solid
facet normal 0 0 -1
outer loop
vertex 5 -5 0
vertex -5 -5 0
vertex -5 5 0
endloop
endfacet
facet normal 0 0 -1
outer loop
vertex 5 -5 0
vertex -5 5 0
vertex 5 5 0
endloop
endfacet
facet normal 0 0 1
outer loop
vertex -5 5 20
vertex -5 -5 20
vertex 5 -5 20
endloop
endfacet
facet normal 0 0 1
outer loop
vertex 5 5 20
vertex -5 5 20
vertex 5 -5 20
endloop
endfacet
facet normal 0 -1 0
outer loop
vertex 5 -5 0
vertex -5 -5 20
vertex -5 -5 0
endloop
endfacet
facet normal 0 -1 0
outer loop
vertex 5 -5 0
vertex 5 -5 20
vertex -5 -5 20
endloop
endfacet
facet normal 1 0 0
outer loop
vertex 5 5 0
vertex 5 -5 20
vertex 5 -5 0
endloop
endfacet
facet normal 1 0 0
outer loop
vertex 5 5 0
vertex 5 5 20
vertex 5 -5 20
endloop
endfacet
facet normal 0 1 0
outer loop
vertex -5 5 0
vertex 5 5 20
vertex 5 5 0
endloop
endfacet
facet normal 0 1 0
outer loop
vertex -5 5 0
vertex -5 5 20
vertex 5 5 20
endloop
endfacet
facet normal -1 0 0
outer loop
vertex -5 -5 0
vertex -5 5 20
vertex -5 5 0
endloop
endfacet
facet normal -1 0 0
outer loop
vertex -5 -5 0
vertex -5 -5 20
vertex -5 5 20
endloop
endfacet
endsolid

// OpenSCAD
// Auto-generated from tests/data/feature_fixtures_manifest.json
// fixture: non_revolve_square_prism
// fixture_type: non_revolve
// description: Square cross-section extruded along Z; cross-slice radial profiles differ by angle.
$fn = 96;

side = 10.000000;
height = 20.000000;

translate([-side/2, -side/2, 0]) linear_extrude(height) square(side);
